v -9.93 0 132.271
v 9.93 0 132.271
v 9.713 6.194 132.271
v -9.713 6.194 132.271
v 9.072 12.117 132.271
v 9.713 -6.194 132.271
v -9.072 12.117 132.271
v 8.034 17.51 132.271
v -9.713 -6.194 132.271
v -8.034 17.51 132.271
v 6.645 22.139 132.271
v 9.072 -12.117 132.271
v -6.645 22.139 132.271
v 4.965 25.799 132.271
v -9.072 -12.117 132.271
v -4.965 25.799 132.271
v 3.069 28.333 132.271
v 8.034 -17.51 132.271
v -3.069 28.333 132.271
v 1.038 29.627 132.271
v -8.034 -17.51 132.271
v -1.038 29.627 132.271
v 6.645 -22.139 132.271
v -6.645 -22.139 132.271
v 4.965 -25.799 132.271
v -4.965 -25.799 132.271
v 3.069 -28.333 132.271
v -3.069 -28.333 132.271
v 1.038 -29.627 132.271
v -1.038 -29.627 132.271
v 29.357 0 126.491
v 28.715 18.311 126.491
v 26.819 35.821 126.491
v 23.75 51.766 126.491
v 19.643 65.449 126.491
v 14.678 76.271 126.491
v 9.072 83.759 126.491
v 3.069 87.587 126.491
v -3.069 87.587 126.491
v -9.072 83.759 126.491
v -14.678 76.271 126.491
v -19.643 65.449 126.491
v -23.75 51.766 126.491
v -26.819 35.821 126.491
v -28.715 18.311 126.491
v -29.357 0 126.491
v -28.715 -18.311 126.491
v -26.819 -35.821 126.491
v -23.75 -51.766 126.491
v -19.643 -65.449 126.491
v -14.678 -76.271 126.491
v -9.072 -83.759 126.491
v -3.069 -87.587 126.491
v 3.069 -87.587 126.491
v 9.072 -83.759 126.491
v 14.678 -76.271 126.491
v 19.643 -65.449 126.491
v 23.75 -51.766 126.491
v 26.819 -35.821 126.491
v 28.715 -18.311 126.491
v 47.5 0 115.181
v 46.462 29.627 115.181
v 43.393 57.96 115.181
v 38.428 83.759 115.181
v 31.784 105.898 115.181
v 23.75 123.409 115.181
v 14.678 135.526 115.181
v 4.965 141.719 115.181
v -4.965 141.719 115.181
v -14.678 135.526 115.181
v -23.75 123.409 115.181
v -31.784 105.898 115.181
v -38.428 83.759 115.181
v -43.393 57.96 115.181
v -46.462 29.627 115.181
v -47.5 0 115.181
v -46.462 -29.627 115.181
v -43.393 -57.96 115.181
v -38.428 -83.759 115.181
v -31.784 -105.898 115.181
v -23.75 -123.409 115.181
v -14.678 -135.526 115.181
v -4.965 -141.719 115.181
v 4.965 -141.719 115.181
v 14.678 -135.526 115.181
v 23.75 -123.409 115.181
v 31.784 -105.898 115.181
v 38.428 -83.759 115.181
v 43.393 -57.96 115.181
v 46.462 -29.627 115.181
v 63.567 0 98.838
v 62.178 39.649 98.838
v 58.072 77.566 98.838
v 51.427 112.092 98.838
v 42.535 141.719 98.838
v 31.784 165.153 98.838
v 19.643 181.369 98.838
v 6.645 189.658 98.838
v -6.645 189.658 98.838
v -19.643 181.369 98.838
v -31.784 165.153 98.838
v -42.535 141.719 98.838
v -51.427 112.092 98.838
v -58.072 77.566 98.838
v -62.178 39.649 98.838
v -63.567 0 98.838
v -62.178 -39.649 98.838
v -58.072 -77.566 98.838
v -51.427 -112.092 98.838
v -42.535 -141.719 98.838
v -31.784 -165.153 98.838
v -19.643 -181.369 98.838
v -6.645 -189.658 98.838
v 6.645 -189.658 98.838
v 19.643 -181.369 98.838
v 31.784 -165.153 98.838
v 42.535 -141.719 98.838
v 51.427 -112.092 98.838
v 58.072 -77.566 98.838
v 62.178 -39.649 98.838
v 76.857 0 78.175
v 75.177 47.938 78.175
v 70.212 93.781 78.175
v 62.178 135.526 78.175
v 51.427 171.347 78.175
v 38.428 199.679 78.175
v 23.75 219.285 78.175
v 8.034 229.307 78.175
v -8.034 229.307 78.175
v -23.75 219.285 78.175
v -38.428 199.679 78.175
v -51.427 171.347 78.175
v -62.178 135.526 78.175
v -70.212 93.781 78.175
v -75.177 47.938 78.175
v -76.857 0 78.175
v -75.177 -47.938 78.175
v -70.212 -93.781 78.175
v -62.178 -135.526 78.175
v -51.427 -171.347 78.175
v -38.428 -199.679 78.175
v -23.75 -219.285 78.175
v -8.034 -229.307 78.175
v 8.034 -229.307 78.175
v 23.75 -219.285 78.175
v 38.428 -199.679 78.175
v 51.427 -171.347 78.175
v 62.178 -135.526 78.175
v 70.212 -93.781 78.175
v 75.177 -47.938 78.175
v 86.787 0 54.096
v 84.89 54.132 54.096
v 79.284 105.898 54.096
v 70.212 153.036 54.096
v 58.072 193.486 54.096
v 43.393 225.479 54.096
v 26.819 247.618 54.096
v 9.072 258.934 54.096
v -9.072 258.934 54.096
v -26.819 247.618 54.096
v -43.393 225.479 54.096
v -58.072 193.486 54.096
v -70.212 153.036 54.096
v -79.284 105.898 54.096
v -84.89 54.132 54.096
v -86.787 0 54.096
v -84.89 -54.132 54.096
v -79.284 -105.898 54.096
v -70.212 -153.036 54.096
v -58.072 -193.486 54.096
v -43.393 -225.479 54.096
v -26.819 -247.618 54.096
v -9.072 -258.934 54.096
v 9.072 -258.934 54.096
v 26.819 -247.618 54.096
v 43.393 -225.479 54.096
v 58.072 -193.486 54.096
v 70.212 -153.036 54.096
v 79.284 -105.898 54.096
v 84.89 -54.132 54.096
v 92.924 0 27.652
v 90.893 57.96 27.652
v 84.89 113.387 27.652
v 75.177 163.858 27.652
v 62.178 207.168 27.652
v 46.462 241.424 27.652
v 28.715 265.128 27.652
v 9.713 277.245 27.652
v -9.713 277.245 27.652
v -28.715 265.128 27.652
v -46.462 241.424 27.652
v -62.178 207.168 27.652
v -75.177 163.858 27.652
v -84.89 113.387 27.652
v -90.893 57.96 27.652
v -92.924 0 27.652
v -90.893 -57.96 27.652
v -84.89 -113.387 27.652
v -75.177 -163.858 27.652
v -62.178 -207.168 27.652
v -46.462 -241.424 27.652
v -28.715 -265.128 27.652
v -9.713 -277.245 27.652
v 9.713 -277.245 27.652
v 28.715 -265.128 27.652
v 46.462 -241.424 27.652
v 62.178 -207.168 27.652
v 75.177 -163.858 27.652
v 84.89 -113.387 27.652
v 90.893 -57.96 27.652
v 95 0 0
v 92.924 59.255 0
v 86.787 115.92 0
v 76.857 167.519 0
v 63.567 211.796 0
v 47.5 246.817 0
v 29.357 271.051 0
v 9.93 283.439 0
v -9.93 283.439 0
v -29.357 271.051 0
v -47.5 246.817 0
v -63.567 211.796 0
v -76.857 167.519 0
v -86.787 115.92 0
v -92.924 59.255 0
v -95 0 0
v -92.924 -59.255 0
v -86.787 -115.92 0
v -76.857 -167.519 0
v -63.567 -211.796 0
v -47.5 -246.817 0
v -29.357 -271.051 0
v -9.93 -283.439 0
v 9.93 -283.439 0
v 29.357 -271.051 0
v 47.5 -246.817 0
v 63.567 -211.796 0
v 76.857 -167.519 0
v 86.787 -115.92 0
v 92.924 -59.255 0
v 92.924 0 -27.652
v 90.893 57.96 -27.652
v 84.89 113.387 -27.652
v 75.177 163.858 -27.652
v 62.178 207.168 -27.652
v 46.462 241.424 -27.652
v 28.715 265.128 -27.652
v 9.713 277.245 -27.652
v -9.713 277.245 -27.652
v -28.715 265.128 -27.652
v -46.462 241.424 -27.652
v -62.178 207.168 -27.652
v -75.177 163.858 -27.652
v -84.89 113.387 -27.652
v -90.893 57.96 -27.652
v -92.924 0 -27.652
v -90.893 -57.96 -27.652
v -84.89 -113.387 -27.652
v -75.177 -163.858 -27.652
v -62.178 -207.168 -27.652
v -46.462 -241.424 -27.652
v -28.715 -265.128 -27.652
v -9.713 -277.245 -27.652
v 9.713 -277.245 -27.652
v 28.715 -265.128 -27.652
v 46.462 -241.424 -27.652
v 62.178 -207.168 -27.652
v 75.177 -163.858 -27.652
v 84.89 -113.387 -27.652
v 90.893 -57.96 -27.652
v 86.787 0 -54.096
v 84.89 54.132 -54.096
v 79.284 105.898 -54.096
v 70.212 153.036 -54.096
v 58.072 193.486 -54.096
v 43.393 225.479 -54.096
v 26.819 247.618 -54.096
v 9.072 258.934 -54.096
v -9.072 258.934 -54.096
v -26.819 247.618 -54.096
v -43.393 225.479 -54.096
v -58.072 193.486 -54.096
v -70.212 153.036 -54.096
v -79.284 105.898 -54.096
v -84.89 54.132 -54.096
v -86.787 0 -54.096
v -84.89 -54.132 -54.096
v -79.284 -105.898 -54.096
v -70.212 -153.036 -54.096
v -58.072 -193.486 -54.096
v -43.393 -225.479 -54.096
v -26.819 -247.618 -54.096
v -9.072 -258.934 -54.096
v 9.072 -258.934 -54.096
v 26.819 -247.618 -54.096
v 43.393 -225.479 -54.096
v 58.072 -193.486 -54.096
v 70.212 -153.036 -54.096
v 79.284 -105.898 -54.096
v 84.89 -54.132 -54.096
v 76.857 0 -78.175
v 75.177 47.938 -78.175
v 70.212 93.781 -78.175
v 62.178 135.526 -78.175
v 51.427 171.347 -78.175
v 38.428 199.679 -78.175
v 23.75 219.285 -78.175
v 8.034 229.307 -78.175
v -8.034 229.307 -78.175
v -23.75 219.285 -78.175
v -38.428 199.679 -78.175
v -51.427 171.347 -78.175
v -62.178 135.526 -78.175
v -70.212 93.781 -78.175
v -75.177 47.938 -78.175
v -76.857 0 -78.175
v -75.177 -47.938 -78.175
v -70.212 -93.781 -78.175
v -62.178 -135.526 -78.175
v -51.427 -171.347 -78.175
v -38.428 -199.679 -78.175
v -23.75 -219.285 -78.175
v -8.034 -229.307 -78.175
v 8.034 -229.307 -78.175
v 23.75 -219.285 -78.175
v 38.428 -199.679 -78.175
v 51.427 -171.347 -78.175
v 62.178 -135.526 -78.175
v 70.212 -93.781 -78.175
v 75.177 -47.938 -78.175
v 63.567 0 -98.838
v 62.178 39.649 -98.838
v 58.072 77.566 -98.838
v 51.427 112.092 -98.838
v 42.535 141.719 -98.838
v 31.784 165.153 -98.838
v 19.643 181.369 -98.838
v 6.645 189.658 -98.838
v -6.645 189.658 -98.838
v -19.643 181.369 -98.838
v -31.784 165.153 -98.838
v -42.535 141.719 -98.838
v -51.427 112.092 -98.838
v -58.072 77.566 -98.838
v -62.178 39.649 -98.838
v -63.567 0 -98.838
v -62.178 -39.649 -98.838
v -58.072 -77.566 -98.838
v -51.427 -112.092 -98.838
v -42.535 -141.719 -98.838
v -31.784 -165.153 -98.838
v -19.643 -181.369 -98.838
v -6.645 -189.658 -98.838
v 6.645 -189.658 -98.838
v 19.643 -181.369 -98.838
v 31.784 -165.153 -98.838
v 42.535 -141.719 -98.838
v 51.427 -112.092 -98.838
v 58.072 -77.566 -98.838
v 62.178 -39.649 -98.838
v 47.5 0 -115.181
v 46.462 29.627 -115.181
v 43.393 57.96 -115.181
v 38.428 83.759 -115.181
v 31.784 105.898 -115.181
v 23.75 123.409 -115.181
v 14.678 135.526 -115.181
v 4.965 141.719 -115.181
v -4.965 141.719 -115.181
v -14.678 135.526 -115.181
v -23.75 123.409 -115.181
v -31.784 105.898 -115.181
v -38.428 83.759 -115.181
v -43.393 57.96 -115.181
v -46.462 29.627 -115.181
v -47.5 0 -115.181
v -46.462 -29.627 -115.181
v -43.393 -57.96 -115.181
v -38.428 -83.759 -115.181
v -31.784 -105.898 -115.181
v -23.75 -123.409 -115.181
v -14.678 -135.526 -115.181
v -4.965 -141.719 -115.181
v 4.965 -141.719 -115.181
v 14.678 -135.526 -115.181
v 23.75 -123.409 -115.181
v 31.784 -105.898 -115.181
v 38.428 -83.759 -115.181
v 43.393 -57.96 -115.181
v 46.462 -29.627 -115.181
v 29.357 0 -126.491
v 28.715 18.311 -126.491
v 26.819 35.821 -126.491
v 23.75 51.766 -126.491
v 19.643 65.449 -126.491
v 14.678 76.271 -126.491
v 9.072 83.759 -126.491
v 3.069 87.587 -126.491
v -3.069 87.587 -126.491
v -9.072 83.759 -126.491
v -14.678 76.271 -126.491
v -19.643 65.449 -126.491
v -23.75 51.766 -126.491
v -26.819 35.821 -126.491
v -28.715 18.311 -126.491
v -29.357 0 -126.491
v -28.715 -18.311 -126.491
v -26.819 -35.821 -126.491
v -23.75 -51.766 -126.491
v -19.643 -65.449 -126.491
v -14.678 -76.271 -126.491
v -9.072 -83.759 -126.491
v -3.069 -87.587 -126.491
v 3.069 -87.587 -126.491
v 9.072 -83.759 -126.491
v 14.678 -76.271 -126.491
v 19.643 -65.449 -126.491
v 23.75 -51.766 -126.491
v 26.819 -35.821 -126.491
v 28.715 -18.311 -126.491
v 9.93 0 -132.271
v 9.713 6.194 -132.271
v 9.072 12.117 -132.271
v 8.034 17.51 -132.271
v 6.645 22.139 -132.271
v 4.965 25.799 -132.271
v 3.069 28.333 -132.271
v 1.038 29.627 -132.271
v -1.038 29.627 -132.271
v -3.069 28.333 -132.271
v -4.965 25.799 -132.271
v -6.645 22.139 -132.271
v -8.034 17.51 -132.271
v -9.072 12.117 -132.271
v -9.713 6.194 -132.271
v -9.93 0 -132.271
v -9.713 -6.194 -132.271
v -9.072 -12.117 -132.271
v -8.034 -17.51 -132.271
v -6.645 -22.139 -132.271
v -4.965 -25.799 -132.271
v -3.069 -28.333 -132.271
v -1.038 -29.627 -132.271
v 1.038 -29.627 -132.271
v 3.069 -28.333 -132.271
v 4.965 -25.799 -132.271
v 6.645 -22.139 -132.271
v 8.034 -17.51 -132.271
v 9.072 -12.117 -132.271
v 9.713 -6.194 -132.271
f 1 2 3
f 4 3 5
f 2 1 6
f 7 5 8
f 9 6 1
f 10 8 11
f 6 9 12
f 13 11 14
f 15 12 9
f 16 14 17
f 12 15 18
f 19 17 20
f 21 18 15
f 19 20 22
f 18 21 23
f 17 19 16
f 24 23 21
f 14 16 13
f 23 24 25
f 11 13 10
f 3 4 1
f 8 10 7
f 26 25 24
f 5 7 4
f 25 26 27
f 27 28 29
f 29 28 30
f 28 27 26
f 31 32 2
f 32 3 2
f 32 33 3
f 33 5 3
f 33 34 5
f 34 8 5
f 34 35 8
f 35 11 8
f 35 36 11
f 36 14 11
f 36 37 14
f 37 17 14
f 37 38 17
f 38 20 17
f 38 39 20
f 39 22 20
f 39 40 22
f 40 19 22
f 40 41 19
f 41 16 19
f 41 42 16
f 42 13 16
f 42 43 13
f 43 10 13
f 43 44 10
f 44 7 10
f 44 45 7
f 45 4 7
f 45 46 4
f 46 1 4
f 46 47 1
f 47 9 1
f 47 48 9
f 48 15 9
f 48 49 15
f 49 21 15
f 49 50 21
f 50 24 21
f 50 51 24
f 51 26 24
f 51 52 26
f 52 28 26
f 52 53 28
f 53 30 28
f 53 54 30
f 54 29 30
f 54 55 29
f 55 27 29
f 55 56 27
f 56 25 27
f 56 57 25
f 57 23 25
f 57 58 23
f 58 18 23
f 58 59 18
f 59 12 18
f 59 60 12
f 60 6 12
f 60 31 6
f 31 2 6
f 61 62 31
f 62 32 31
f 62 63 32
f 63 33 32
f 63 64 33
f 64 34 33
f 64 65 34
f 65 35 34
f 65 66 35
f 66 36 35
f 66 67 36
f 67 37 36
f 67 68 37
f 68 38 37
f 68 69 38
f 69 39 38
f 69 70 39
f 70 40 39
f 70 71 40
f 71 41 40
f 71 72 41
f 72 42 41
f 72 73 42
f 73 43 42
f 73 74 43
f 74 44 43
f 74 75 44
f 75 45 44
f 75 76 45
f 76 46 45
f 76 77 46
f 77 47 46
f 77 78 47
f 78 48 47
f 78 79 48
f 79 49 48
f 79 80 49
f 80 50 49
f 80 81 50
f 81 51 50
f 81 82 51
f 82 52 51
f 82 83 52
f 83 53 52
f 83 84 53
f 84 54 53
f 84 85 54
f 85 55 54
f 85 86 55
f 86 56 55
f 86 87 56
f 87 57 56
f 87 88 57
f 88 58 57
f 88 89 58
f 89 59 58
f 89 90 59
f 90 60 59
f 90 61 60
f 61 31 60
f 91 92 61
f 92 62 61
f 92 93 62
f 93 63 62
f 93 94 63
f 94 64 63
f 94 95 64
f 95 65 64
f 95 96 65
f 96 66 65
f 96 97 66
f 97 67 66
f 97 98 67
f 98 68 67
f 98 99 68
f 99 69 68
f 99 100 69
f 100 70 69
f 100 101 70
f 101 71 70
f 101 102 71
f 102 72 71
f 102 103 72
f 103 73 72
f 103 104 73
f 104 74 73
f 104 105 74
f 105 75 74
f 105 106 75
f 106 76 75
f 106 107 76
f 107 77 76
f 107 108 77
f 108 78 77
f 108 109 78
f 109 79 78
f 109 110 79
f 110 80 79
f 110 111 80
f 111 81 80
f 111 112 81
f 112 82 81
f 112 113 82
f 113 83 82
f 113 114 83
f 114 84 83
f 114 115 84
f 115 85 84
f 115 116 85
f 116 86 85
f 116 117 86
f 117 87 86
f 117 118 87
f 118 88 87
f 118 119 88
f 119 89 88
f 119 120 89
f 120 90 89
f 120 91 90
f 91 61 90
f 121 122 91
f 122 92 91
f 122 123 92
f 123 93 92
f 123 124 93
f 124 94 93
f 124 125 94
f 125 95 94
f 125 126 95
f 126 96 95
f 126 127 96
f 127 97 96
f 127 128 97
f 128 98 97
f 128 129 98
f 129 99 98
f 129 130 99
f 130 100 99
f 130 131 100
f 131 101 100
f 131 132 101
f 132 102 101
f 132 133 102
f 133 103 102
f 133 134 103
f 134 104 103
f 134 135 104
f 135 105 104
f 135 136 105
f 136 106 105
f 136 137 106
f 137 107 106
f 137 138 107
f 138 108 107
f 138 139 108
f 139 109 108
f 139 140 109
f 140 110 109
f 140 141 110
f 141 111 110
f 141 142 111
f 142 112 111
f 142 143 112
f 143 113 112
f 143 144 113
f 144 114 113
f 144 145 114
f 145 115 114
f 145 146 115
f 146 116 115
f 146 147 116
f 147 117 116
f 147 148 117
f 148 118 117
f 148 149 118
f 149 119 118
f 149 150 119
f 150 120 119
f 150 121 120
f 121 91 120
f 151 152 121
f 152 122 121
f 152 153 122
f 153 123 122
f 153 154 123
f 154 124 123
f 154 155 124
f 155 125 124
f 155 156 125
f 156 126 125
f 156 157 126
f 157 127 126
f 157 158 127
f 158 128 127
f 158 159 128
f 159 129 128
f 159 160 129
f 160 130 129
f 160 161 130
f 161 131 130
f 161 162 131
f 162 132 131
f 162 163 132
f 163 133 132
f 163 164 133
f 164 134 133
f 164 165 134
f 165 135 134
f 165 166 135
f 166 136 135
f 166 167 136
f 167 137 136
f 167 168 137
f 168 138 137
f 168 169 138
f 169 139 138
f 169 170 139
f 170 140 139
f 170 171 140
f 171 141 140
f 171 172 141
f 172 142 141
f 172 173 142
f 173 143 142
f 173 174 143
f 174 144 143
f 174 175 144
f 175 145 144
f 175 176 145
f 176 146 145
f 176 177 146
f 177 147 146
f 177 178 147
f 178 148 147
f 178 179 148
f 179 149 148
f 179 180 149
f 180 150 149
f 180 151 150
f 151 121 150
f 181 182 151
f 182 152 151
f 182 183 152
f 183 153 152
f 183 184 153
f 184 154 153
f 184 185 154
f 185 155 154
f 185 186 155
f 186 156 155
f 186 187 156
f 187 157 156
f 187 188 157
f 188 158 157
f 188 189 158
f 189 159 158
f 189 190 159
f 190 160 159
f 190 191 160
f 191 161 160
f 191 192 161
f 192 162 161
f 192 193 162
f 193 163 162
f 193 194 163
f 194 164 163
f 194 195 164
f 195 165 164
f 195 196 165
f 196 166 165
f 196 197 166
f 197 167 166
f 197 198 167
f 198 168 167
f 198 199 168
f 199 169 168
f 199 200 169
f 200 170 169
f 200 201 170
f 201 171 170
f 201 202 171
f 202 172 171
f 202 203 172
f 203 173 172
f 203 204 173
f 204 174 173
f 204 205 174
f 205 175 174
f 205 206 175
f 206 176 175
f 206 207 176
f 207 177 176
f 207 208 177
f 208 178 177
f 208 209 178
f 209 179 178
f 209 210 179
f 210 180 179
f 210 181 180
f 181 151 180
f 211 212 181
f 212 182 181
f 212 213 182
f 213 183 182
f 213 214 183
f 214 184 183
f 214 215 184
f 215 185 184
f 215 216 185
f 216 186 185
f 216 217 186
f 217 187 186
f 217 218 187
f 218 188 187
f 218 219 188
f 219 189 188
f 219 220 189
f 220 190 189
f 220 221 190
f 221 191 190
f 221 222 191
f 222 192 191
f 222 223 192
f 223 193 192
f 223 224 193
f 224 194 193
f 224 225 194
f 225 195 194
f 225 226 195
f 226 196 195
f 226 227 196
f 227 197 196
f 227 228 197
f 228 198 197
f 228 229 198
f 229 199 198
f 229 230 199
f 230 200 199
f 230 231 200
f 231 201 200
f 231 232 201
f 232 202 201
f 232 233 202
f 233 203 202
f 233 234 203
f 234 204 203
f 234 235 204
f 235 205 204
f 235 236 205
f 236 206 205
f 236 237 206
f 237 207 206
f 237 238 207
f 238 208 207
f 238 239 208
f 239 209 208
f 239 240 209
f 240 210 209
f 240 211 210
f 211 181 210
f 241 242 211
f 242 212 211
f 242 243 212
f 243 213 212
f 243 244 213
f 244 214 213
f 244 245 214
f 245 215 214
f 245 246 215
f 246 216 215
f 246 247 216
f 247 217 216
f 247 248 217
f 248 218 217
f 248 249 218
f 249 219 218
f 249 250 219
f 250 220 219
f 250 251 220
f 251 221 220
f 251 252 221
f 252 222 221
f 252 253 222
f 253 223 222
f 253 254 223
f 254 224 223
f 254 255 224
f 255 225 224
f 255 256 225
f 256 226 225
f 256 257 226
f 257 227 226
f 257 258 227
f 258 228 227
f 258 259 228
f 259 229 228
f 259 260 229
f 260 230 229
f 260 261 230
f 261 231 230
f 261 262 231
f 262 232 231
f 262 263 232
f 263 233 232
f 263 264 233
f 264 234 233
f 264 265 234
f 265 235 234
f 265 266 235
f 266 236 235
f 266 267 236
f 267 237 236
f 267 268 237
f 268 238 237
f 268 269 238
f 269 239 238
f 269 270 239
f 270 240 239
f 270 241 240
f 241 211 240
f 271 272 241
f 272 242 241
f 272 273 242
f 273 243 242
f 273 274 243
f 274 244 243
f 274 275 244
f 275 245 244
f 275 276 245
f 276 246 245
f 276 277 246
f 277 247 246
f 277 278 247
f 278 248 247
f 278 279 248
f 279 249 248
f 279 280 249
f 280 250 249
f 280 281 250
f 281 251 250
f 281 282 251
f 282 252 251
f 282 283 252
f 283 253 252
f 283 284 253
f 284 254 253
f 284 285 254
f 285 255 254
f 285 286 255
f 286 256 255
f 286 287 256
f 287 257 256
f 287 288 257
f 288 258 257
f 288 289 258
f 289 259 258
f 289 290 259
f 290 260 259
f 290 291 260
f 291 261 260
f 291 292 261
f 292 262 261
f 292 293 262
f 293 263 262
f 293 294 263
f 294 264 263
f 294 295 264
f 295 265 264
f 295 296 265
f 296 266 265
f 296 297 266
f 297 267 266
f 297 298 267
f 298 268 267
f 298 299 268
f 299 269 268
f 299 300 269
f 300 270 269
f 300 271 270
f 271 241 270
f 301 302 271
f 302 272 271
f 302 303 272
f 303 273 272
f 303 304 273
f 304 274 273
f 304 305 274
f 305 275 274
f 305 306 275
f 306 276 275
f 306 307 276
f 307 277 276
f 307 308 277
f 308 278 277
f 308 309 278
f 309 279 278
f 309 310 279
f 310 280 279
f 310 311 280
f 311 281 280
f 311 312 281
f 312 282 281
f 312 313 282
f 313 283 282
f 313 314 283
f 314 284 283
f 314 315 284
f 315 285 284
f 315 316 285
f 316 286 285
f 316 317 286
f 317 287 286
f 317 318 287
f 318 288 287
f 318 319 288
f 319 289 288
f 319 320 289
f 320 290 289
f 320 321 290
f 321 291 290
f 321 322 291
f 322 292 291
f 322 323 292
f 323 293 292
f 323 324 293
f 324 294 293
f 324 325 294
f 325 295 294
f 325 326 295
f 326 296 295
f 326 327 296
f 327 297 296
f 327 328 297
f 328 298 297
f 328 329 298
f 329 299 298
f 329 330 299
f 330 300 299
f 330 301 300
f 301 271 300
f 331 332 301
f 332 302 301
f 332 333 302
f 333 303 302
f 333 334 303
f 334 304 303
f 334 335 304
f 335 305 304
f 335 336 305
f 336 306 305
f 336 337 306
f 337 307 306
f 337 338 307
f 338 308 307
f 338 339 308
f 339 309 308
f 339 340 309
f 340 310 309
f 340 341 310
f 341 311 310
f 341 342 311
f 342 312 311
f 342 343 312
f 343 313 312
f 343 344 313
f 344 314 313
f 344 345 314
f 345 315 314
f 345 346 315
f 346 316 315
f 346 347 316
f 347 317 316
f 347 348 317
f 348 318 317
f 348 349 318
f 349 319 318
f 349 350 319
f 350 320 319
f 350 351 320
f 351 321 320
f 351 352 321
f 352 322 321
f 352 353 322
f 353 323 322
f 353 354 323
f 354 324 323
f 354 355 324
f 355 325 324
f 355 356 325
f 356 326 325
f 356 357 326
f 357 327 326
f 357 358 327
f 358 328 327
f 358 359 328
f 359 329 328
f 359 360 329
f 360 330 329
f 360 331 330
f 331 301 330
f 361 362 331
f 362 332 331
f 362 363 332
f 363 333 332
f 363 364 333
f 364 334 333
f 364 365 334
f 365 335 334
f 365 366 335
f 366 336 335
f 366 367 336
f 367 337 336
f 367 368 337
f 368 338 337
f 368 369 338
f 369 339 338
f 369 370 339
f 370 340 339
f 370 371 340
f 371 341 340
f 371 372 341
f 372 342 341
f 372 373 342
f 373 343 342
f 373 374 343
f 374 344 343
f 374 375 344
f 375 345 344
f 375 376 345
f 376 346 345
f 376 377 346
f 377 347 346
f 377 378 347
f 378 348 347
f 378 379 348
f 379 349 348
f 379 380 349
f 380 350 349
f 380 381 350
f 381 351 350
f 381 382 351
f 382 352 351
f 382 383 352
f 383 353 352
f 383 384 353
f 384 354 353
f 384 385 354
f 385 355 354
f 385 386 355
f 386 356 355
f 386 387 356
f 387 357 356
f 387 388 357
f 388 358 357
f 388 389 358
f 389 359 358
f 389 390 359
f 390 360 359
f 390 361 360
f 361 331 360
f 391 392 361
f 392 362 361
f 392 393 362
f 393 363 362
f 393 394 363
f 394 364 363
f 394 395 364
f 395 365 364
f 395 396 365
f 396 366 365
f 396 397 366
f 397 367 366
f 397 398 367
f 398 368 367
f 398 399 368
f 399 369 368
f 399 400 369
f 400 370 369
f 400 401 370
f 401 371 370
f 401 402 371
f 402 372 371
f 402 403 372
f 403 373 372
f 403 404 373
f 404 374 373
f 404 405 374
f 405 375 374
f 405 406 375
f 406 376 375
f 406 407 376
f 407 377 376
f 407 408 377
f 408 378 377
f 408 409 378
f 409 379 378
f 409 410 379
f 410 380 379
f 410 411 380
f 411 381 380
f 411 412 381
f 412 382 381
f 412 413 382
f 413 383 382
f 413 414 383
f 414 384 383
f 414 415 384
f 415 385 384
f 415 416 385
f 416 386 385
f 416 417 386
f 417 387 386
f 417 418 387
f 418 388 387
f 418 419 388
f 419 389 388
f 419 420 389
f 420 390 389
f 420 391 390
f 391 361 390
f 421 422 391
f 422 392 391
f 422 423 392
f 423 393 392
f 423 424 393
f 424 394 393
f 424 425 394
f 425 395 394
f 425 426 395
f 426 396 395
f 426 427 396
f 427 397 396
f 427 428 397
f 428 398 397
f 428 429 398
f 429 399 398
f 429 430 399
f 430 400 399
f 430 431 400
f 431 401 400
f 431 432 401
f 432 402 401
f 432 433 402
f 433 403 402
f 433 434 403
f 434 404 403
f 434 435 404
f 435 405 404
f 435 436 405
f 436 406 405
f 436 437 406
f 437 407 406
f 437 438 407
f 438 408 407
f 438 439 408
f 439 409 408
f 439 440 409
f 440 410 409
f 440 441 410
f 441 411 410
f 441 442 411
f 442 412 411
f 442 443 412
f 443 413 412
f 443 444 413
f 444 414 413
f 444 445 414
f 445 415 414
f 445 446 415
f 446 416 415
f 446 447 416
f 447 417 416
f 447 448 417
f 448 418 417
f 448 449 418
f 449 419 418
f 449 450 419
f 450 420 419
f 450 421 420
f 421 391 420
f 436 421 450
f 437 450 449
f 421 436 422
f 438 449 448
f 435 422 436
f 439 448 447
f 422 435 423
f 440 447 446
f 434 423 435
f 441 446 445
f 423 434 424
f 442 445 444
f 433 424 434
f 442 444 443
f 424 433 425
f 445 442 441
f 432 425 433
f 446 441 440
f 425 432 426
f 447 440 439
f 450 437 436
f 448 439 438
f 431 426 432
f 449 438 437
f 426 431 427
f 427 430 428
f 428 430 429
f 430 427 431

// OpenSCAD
// Generated by SolidPython 1.0.1 on 2020-07-29 00:46:46


scale(v = [5, 15, 7]) {
	sphere(r = 19);
}
/***********************************************
*********      SolidPython code:      **********
************************************************
 
# import packages: SolidPython
from solid import *
from solid.utils import *
from itertools import chain, combinations, permutations


class Resize:

    def __init__(self, scad_file):
        self.scad_file = scad_file
        #self.scad_file = import_scad(scad_file)
        # cone/cylinder param:
        self.r1 = 0
        self.r2 = 0
        self.h = 0
        # rectangular prism param:
        self.w = 0
        self.l = 0
        # ellipse param:
        self.r = 0

    # import OpenScad code (file name corresponds to shape)


    # classify shape + parameters
    def assign(self, param1, param2, param3):
        if self.scad_file == 'cone.scad':
            self.r1 = param1
            self.r2 = param2
            self.h = param3
        elif self.scad_file == 'cylinder.scad':
            self.r1 = param1
            self.r2 = param2
            self.h = param3
        elif self.scad_file == 'rectangularPrism.scad':
            self.h = param1
            self.l = param2
            self.w = param3
        else:
            self.r = param1
            self.h = param2

    # resize parameters
    def iterate(self):
        x = range(3, 20, 2)
        i = 1
        if self.scad_file == 'cone.scad':
            tempList = list(permutations(x, 2))
            for temp in tempList:
                param1 = temp[0]
                param2 = temp[1]
                filepath = 'produced_scad_files/' + 'cone' + str(param1) + '_' + str(param2) + '_' + '.scad'
                scad_render_to_file(cylinder(h=param1, r1=param2, r2=0), filepath)

        elif self.scad_file == 'cylinder.scad':
            tempList = list(permutations(x, 3))
            for temp in tempList:
                param1 = temp[0]
                param2 = temp[1]
                filepath = 'produced_scad_files/' + 'cylinder' + str(param1) + '_' + str(param2) + '_' + '.scad'
                scad_render_to_file(cylinder(h=param1, r1=param2, r2=param2), filepath)

        elif self.scad_file == 'rectangularPrism.scad':
            tempList = list(permutations(x, 3))
            for temp in tempList:
                param1 = temp[0]
                param2 = temp[1]
                param3 = temp[2]
                filepath = 'produced_scad_files/' + 'rectangularPrism' + str(param1) + '_' + str(param2) + '_' + str(
                    param3) + '.scad'
                scad_render_to_file(cube(size=(param1, param2, param3)), filepath)

        elif self.scad_file == 'ellipse.scad':
            tempList = list(permutations(x, 4))
            for temp in tempList:
                param1 = temp[0]
                param2 = temp[1]
                param3 = temp[2]
                param4 = temp[3]
                filepath = 'produced_scad_files/' + 'ellipse' + str(param1) + '_' + str(param2) + '_' + str(param3) + '_' + str(param4) + '.scad'
                scad_render_to_file(scale([param1, param2, param3])(sphere(r=param4)), filepath)

    def render_to_scadfile(self):
        scad_render_to_file(scad, 'example.scad') 
 
************************************************/
